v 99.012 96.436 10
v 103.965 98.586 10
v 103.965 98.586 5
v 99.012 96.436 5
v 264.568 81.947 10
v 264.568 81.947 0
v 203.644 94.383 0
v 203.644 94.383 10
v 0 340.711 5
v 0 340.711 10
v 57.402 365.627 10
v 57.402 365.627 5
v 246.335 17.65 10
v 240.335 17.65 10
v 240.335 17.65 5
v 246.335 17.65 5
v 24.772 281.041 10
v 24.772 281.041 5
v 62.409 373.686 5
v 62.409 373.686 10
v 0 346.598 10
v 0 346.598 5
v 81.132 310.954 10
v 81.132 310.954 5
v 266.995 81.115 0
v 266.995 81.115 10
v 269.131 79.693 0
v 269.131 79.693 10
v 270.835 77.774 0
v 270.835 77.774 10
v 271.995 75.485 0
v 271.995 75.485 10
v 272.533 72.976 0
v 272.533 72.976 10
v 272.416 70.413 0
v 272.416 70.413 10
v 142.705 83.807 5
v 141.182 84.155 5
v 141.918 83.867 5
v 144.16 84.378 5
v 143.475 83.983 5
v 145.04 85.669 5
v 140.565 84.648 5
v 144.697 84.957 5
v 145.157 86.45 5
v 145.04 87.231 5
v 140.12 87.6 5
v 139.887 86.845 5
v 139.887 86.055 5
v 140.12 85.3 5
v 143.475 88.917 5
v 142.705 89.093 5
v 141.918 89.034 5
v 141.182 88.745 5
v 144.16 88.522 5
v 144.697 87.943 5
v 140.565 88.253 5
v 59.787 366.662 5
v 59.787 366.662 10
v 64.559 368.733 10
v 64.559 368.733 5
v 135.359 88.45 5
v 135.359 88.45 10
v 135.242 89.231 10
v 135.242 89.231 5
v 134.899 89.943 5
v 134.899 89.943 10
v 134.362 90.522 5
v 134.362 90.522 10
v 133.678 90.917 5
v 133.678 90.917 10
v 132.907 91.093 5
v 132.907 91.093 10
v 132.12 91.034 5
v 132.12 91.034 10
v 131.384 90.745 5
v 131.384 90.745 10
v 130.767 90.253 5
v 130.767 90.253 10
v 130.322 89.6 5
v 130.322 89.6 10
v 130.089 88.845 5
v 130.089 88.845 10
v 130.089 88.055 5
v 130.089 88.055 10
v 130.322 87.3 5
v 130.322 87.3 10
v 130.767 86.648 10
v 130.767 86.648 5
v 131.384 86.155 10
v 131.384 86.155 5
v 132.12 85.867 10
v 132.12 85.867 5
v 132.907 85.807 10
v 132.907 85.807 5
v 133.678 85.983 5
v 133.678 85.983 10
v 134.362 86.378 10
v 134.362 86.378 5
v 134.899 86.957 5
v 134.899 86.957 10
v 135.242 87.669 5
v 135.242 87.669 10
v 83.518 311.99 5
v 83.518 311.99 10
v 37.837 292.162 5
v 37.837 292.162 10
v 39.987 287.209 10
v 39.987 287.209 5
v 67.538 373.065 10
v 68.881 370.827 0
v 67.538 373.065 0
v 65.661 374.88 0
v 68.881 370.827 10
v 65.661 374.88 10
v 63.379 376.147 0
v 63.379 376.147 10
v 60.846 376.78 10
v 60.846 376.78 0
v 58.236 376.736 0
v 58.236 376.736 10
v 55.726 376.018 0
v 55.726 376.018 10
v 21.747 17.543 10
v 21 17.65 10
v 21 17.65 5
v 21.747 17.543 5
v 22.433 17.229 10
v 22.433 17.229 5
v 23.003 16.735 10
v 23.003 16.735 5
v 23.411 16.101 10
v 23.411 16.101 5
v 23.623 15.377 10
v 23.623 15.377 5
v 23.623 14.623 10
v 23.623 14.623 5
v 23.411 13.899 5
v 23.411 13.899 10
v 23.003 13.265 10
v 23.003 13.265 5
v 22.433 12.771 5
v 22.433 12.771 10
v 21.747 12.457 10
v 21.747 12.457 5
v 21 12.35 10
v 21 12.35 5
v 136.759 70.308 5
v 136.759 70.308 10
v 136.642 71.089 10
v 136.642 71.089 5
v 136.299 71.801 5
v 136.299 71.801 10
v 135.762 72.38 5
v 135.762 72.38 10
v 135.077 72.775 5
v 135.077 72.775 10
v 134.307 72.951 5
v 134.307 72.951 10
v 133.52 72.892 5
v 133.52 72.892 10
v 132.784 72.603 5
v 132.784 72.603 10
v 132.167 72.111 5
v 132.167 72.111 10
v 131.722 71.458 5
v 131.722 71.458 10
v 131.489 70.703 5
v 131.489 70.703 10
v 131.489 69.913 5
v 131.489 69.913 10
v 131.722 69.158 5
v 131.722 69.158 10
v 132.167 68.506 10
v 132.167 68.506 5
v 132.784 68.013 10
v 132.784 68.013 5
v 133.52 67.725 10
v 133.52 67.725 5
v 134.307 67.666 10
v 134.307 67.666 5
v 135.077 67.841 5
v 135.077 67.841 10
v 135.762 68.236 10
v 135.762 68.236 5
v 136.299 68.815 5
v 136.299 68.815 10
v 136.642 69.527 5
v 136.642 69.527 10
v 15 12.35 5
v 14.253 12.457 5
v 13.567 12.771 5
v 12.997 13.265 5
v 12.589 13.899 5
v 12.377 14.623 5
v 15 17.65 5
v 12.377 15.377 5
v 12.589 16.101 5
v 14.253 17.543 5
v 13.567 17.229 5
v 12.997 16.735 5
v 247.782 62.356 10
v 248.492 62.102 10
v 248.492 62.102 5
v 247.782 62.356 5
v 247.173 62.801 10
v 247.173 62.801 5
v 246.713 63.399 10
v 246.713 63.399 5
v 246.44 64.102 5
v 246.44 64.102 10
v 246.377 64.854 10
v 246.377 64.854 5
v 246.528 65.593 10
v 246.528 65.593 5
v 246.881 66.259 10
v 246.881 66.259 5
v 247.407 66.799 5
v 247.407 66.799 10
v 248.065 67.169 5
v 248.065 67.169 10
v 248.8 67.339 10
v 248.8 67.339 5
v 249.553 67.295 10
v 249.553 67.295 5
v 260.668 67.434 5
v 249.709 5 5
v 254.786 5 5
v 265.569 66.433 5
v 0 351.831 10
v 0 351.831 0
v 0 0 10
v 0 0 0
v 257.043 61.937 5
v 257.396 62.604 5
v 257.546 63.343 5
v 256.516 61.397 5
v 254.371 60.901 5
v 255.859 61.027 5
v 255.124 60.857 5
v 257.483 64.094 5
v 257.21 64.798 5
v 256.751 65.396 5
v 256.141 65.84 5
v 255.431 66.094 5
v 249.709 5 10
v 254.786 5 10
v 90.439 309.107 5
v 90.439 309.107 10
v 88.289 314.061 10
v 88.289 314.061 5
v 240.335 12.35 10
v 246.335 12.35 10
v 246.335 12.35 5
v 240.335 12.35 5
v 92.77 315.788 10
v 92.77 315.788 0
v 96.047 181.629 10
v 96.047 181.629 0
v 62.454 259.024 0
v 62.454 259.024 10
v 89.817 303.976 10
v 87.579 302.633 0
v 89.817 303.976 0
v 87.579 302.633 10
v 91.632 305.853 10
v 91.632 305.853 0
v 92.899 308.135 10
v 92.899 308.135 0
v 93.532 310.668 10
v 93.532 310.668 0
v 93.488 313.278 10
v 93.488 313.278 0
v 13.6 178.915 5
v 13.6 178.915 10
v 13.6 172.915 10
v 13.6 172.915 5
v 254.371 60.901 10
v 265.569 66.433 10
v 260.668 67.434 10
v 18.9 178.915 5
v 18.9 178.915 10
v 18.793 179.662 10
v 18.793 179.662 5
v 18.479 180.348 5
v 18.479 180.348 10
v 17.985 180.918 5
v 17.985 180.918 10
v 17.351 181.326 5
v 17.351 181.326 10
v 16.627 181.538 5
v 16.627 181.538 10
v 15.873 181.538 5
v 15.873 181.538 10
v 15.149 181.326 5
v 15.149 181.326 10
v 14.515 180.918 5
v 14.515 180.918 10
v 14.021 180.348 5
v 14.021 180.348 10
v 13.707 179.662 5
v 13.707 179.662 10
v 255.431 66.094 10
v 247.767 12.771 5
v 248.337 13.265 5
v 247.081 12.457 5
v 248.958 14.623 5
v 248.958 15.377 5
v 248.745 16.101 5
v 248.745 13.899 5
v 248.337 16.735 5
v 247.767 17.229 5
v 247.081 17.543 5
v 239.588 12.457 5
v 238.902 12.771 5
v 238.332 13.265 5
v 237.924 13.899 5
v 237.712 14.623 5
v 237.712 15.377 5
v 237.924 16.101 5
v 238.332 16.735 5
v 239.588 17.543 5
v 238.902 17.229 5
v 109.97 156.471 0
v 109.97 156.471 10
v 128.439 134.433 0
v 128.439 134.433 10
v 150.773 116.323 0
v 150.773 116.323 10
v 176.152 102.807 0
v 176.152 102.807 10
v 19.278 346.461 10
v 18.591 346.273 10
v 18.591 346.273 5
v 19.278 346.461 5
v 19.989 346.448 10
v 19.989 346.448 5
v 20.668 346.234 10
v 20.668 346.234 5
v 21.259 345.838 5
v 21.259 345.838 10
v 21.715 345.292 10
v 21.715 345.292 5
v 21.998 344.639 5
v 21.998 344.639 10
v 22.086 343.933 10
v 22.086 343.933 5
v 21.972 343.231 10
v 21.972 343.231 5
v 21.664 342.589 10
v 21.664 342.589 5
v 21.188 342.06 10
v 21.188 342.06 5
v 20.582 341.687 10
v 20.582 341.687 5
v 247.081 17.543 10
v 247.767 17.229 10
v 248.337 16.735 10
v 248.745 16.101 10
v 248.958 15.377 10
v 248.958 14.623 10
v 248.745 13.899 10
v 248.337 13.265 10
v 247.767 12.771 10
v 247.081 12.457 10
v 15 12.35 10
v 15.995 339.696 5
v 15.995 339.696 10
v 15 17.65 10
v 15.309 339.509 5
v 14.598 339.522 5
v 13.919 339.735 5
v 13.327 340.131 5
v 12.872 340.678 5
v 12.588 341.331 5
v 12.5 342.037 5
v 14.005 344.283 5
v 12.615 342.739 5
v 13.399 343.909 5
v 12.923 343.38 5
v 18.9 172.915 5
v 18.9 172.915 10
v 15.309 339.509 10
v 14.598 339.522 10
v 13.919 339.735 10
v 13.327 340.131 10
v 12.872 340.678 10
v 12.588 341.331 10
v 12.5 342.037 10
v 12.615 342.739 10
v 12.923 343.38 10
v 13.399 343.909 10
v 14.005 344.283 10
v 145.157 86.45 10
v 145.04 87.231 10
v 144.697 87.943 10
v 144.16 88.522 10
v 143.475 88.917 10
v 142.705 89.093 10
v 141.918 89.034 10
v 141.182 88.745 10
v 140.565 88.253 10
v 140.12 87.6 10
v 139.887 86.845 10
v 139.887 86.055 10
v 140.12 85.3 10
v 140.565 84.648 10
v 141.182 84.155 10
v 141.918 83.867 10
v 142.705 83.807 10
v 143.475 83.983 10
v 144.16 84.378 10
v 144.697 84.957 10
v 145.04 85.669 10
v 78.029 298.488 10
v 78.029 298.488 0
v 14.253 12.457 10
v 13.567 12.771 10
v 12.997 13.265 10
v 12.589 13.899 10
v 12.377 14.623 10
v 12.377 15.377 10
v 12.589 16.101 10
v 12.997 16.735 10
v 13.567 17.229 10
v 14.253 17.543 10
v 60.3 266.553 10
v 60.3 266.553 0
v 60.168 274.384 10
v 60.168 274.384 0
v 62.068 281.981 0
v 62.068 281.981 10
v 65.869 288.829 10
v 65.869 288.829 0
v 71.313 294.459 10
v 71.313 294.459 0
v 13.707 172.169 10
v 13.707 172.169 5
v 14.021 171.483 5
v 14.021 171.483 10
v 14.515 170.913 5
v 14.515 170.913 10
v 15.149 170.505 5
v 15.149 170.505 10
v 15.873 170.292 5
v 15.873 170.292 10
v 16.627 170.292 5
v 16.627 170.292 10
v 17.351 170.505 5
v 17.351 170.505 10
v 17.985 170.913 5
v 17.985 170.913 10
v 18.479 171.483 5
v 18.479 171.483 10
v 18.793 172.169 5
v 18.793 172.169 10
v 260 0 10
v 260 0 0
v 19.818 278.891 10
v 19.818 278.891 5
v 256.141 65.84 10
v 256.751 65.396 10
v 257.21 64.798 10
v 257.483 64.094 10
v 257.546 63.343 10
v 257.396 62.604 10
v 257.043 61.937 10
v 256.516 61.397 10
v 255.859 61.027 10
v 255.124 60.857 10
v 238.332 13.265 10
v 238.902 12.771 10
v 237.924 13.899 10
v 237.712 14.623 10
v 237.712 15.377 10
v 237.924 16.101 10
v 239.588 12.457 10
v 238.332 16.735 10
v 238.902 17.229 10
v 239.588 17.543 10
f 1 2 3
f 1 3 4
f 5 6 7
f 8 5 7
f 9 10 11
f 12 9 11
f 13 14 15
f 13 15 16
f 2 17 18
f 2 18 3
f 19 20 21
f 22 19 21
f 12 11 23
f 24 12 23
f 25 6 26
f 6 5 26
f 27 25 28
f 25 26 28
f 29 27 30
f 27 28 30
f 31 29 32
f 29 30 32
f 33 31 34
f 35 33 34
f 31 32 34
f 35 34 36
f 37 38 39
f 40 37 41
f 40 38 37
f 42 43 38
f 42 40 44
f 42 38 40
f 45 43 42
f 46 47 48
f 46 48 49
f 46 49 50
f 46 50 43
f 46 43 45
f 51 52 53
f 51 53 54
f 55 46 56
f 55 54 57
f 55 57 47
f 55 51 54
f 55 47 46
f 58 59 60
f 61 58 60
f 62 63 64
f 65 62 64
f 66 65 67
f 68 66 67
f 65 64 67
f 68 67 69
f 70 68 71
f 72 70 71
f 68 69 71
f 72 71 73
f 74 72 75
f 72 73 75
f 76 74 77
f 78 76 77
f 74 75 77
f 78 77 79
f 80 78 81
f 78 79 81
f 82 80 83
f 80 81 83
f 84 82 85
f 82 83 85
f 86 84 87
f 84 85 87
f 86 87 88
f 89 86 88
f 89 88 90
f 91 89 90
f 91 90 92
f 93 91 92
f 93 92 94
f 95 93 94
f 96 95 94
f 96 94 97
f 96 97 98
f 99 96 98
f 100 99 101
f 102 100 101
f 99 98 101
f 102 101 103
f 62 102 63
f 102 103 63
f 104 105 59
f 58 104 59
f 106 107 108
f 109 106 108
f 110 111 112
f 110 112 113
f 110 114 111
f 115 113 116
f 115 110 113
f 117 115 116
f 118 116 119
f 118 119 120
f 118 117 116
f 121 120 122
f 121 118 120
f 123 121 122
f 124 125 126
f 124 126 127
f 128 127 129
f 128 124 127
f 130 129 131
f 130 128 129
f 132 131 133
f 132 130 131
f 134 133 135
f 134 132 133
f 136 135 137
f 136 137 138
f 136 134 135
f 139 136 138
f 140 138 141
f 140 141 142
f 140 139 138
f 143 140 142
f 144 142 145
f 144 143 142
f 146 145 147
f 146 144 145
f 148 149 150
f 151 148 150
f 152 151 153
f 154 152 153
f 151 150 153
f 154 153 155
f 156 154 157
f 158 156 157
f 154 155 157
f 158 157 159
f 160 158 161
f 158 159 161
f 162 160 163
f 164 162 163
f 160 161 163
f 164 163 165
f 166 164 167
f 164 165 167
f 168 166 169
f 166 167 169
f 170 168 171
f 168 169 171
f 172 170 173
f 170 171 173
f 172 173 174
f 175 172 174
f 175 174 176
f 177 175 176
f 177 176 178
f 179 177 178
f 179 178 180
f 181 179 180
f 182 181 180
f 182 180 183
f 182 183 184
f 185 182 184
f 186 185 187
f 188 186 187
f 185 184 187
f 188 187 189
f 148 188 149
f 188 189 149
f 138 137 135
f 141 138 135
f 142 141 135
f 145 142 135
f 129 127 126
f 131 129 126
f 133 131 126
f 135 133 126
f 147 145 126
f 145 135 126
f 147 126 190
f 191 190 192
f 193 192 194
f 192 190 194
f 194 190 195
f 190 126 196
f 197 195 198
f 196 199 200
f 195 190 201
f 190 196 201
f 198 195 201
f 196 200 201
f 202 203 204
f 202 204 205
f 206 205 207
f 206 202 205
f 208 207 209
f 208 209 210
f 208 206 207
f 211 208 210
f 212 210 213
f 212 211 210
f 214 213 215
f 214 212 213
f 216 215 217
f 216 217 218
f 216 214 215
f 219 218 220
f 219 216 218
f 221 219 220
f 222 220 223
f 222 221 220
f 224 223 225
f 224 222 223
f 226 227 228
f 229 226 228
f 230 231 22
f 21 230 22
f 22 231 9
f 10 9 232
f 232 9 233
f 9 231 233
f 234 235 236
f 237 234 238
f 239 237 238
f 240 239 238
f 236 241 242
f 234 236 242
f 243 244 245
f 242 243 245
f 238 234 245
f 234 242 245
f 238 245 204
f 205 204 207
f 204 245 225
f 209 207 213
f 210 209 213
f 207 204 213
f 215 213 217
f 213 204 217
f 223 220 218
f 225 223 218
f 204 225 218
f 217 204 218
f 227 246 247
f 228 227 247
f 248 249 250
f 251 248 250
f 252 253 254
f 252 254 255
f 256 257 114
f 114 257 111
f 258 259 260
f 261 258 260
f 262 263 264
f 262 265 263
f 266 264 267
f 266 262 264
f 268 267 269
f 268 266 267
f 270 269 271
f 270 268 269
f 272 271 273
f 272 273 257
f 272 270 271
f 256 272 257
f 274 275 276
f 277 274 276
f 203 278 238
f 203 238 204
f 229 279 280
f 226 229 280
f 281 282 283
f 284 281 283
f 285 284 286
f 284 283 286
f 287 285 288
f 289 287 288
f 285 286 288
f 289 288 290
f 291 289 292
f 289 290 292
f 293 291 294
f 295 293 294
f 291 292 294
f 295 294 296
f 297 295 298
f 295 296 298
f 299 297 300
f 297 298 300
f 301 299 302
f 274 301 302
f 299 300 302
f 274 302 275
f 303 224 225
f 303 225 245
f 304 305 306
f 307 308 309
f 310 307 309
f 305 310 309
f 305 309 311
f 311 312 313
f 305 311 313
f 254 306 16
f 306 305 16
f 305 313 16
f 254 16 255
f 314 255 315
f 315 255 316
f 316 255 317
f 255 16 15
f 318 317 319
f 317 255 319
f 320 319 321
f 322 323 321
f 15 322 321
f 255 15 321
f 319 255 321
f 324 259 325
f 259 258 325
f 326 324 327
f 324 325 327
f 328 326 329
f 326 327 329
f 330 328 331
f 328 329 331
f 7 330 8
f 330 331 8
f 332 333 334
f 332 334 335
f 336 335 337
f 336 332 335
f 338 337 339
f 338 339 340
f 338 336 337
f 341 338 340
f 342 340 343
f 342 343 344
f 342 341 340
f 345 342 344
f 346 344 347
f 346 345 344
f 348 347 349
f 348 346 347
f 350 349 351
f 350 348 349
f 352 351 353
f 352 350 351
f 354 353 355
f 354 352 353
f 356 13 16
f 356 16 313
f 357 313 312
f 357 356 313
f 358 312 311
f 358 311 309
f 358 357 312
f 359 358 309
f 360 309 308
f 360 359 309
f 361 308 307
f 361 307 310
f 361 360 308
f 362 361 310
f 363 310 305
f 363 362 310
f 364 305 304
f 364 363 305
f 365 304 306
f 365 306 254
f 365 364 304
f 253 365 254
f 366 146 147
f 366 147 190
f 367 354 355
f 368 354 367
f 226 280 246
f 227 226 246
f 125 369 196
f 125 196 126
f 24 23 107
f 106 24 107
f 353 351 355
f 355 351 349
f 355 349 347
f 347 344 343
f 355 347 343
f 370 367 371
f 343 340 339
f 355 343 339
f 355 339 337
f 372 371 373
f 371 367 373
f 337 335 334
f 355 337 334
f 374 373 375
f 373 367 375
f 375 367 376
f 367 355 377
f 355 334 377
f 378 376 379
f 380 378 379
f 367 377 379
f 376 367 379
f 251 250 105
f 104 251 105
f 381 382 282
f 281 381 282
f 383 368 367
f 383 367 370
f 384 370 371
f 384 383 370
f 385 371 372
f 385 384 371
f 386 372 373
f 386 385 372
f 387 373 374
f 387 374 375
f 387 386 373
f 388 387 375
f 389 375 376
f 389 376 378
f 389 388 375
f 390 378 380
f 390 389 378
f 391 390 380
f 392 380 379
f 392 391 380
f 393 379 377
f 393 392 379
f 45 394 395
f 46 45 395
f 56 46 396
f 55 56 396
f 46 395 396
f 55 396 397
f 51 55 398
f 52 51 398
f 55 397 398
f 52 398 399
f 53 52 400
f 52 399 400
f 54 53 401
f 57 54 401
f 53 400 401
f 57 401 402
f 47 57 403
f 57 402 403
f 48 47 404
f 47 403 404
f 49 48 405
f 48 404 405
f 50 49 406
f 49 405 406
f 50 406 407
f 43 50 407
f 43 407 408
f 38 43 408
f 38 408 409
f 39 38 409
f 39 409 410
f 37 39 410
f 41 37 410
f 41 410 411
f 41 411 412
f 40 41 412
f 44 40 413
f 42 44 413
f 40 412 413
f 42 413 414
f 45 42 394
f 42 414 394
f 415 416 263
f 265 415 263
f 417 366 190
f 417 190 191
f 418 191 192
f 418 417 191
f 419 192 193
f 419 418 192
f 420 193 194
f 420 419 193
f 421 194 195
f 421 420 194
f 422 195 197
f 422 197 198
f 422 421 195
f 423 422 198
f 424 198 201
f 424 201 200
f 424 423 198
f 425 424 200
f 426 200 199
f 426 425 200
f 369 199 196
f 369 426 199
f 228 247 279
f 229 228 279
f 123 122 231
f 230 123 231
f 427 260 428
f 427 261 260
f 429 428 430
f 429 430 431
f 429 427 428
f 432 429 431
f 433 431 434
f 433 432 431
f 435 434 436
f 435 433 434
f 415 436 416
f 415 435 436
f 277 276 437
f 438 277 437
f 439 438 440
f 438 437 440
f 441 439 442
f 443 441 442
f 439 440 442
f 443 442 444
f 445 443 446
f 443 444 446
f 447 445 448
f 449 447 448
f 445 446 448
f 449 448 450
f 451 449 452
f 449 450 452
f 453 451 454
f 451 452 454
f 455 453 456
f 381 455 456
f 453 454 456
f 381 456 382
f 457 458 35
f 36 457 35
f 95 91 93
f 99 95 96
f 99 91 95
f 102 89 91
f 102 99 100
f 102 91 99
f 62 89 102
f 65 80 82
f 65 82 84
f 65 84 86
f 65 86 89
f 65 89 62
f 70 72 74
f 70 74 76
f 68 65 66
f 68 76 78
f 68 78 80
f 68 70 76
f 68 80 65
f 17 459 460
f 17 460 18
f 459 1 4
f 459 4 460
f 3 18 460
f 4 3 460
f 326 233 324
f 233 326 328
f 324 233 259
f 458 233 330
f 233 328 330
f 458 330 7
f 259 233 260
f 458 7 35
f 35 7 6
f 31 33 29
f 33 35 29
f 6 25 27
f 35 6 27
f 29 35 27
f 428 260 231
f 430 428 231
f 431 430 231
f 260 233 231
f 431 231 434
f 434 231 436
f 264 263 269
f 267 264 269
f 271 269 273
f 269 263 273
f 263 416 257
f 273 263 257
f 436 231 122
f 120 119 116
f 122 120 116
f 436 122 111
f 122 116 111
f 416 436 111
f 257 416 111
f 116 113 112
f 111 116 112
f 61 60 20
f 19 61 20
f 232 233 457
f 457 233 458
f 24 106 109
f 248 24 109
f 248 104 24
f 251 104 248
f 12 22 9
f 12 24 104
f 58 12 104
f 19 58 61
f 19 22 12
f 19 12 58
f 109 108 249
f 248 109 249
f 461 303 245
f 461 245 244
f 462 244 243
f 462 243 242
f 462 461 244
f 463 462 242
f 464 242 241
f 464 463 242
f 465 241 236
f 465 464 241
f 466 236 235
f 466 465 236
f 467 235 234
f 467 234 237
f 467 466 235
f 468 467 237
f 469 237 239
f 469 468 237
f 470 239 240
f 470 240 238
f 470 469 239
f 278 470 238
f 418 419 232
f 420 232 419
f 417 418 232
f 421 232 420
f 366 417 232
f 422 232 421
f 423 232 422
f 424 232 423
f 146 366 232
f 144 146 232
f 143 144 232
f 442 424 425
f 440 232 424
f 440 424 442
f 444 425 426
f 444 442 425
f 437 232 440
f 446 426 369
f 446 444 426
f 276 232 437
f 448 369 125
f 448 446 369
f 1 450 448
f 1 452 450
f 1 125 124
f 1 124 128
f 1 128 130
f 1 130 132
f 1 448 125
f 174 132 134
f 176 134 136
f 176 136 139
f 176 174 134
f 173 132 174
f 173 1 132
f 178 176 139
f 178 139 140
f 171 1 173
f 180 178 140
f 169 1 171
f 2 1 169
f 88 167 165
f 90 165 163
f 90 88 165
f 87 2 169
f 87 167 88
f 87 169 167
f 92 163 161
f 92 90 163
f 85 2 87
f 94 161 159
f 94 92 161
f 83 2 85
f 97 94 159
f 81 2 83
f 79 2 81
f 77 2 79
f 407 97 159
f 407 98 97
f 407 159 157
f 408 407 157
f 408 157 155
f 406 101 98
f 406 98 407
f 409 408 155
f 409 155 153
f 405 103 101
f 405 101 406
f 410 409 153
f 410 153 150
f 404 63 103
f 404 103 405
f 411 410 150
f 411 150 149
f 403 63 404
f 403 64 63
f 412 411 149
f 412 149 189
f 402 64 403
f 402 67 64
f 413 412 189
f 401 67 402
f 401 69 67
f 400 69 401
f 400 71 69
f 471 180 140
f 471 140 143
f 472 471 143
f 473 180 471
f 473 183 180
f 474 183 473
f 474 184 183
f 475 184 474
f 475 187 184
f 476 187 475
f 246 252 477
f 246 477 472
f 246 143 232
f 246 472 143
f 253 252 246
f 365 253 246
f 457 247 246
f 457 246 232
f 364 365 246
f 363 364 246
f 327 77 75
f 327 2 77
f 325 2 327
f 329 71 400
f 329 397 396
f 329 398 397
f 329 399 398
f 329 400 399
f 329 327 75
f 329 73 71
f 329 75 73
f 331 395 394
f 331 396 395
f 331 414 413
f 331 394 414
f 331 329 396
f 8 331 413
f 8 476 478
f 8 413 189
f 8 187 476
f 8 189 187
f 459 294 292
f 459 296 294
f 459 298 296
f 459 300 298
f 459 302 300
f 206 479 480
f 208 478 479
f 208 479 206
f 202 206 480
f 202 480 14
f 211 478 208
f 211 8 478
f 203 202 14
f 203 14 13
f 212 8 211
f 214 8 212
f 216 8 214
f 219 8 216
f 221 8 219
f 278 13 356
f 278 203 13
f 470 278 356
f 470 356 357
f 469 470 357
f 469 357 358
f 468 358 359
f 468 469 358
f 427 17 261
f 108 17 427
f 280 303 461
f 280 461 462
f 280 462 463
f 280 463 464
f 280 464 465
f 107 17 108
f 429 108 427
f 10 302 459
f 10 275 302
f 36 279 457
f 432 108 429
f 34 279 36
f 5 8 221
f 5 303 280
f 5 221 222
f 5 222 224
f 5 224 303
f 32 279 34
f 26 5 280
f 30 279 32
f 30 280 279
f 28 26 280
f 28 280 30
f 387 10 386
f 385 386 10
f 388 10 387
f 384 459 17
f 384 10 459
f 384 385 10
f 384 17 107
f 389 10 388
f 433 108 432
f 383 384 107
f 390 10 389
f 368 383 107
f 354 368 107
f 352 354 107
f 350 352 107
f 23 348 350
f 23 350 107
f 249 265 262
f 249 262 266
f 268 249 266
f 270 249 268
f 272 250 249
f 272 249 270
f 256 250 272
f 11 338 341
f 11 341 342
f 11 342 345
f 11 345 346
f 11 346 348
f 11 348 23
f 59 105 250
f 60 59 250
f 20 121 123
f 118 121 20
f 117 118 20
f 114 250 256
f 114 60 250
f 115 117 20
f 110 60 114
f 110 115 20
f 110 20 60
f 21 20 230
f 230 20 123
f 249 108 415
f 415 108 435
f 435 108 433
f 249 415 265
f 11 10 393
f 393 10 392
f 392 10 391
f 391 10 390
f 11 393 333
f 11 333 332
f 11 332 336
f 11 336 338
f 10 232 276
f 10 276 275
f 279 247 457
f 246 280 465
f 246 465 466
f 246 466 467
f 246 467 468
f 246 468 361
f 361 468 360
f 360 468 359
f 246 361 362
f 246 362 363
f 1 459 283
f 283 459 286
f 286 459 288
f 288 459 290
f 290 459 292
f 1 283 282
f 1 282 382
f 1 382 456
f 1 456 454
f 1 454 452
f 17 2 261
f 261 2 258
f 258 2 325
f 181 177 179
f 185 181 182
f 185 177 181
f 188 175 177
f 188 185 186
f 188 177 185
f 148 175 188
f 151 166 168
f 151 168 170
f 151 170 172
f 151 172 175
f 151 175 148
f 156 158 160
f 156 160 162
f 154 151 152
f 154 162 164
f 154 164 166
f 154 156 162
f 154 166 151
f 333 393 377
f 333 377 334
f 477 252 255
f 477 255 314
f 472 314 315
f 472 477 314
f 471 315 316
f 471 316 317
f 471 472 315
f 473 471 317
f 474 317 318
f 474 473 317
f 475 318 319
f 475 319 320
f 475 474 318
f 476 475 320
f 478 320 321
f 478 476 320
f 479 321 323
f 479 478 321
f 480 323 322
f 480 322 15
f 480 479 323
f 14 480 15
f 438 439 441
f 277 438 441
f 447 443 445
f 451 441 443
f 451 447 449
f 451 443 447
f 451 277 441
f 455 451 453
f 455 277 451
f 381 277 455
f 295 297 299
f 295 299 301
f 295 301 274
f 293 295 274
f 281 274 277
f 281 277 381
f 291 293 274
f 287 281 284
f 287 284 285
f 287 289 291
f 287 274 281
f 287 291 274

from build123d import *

# Parameters (mm, degrees)
SALIENTE_EXTRUIR1_DEPTH = 10
REDONDEO1_R             = 30
REDONDEO2_R             = 150
REDONDEO3_R             = 10
CORTAR_EXTRUIR1_DEPTH   = 5
CROQUIS4_R              = 2.65
CORTAR_EXTRUIR3_DEPTH   = 5


with BuildPart() as part:
    # Croquis1 → Saliente-Extruir1 (new body)
    with BuildSketch(Plane.XY):
        Polygon((0, 0), (260, 0), (274.106158457, 80), (127.13677389, 110), (50.509014114, 286.543118386), (96.75188515, 306.61463205), (64.899290737, 380), (0, 351.830749872), align=None)
    extrude(amount=SALIENTE_EXTRUIR1_DEPTH)

    # Redondeo1
    redondeo1_edges = [part.edges().sort_by_distance(p)[0] for p in [
        (50.509014114, 286.543118386, 5),
    ]]
    fillet(redondeo1_edges, radius=REDONDEO1_R)

    # Redondeo2
    redondeo2_edges = [part.edges().sort_by_distance(p)[0] for p in [
        (127.13677389, 110, 5),
    ]]
    fillet(redondeo2_edges, radius=REDONDEO2_R)

    # Redondeo3
    redondeo3_edges = [part.edges().sort_by_distance(p)[0] for p in [
        (64.899290737, 380, 5),
        (96.75188515, 306.61463205, 5),
        (274.106158457, 80, 5),
    ]]
    fillet(redondeo3_edges, radius=REDONDEO3_R)

    # Croquis2 → Cortar-Extruir1 (cut)
    with BuildSketch(Plane.XY.offset(10)):
        Polygon((39.986675692, 287.208594669), (90.439116158, 309.107253328), (88.289066035, 314.060765665), (83.517508369, 311.989692162), (59.787325531, 366.661791285), (64.558883197, 368.732864788), (62.408833074, 373.686377124), (0, 346.598099131), (0, 340.711367047), (57.402301073, 365.626581966), (81.13248391, 310.954482844), (37.836625569, 292.162107006), align=None)
    extrude(amount=-CORTAR_EXTRUIR1_DEPTH, mode=Mode.SUBTRACT)

    # Croquis4 → Cortar-Extruir3 (cut)
    with BuildSketch(Plane.XY.offset(10)):
        with Locations((132.709363959, 88.450085292)):
            Circle(CROQUIS4_R)
        with Locations((142.50732293, 86.450085292)):
            Circle(CROQUIS4_R)
        with Locations((134.109252611, 70.308111078)):
            Circle(CROQUIS4_R)
        Polygon((254.785909436, 5), (265.569150028, 66.433298656), (260.668303978, 67.433679667), (249.709468889, 5), align=None)
        with BuildLine():
            Line((240.334745072, 17.65), (246.334745072, 17.65))
            ThreePointArc((246.334745072, 17.65), (248.984745072, 15), (246.334745072, 12.35))
            Line((246.334745072, 12.35), (240.334745072, 12.35))
            ThreePointArc((240.334745072, 12.35), (237.684745072, 15), (240.334745072, 17.65))
        make_face()
        with BuildLine():
            Line((249.552515929, 67.294739764), (255.431207696, 66.094330202))
            ThreePointArc((255.431207696, 66.094330202), (257.497449003, 62.967727115), (254.370845916, 60.901485808))
            Line((254.370845916, 60.901485808), (248.49215415, 62.10189537))
            ThreePointArc((248.49215415, 62.10189537), (246.425912843, 65.228498457), (249.552515929, 67.294739764))
        make_face()
        with BuildLine():
            Line((15, 17.65), (21, 17.65))
            ThreePointArc((21, 17.65), (23.65, 15), (21, 12.35))
            Line((21, 12.35), (15, 12.35))
            ThreePointArc((15, 12.35), (12.35, 15), (15, 17.65))
        make_face()
        Polygon((99.011814836, 96.436284415), (19.818301977, 278.890655481), (24.771814314, 281.040705604), (103.965327172, 98.586334538), align=None)
        with BuildLine():
            Line((13.6, 178.915374936), (13.6, 172.915374936))
            ThreePointArc((13.6, 172.915374936), (16.25, 170.265374936), (18.9, 172.915374936))
            Line((18.9, 172.915374936), (18.9, 178.915374936))
            ThreePointArc((18.9, 178.915374936), (16.25, 181.565374936), (13.6, 178.915374936))
        make_face()
        with BuildLine():
            Line((14.004606425, 344.282692717), (18.591191921, 346.273479867))
            ThreePointArc((18.591191921, 346.273479867), (21.879878245, 344.975580694), (20.581979072, 341.686894371))
            Line((20.581979072, 341.686894371), (15.995393575, 339.69610722))
            ThreePointArc((15.995393575, 339.69610722), (12.706707252, 340.994006393), (14.004606425, 344.282692717))
        make_face()
    extrude(amount=-CORTAR_EXTRUIR3_DEPTH, mode=Mode.SUBTRACT)


solid = part.part
